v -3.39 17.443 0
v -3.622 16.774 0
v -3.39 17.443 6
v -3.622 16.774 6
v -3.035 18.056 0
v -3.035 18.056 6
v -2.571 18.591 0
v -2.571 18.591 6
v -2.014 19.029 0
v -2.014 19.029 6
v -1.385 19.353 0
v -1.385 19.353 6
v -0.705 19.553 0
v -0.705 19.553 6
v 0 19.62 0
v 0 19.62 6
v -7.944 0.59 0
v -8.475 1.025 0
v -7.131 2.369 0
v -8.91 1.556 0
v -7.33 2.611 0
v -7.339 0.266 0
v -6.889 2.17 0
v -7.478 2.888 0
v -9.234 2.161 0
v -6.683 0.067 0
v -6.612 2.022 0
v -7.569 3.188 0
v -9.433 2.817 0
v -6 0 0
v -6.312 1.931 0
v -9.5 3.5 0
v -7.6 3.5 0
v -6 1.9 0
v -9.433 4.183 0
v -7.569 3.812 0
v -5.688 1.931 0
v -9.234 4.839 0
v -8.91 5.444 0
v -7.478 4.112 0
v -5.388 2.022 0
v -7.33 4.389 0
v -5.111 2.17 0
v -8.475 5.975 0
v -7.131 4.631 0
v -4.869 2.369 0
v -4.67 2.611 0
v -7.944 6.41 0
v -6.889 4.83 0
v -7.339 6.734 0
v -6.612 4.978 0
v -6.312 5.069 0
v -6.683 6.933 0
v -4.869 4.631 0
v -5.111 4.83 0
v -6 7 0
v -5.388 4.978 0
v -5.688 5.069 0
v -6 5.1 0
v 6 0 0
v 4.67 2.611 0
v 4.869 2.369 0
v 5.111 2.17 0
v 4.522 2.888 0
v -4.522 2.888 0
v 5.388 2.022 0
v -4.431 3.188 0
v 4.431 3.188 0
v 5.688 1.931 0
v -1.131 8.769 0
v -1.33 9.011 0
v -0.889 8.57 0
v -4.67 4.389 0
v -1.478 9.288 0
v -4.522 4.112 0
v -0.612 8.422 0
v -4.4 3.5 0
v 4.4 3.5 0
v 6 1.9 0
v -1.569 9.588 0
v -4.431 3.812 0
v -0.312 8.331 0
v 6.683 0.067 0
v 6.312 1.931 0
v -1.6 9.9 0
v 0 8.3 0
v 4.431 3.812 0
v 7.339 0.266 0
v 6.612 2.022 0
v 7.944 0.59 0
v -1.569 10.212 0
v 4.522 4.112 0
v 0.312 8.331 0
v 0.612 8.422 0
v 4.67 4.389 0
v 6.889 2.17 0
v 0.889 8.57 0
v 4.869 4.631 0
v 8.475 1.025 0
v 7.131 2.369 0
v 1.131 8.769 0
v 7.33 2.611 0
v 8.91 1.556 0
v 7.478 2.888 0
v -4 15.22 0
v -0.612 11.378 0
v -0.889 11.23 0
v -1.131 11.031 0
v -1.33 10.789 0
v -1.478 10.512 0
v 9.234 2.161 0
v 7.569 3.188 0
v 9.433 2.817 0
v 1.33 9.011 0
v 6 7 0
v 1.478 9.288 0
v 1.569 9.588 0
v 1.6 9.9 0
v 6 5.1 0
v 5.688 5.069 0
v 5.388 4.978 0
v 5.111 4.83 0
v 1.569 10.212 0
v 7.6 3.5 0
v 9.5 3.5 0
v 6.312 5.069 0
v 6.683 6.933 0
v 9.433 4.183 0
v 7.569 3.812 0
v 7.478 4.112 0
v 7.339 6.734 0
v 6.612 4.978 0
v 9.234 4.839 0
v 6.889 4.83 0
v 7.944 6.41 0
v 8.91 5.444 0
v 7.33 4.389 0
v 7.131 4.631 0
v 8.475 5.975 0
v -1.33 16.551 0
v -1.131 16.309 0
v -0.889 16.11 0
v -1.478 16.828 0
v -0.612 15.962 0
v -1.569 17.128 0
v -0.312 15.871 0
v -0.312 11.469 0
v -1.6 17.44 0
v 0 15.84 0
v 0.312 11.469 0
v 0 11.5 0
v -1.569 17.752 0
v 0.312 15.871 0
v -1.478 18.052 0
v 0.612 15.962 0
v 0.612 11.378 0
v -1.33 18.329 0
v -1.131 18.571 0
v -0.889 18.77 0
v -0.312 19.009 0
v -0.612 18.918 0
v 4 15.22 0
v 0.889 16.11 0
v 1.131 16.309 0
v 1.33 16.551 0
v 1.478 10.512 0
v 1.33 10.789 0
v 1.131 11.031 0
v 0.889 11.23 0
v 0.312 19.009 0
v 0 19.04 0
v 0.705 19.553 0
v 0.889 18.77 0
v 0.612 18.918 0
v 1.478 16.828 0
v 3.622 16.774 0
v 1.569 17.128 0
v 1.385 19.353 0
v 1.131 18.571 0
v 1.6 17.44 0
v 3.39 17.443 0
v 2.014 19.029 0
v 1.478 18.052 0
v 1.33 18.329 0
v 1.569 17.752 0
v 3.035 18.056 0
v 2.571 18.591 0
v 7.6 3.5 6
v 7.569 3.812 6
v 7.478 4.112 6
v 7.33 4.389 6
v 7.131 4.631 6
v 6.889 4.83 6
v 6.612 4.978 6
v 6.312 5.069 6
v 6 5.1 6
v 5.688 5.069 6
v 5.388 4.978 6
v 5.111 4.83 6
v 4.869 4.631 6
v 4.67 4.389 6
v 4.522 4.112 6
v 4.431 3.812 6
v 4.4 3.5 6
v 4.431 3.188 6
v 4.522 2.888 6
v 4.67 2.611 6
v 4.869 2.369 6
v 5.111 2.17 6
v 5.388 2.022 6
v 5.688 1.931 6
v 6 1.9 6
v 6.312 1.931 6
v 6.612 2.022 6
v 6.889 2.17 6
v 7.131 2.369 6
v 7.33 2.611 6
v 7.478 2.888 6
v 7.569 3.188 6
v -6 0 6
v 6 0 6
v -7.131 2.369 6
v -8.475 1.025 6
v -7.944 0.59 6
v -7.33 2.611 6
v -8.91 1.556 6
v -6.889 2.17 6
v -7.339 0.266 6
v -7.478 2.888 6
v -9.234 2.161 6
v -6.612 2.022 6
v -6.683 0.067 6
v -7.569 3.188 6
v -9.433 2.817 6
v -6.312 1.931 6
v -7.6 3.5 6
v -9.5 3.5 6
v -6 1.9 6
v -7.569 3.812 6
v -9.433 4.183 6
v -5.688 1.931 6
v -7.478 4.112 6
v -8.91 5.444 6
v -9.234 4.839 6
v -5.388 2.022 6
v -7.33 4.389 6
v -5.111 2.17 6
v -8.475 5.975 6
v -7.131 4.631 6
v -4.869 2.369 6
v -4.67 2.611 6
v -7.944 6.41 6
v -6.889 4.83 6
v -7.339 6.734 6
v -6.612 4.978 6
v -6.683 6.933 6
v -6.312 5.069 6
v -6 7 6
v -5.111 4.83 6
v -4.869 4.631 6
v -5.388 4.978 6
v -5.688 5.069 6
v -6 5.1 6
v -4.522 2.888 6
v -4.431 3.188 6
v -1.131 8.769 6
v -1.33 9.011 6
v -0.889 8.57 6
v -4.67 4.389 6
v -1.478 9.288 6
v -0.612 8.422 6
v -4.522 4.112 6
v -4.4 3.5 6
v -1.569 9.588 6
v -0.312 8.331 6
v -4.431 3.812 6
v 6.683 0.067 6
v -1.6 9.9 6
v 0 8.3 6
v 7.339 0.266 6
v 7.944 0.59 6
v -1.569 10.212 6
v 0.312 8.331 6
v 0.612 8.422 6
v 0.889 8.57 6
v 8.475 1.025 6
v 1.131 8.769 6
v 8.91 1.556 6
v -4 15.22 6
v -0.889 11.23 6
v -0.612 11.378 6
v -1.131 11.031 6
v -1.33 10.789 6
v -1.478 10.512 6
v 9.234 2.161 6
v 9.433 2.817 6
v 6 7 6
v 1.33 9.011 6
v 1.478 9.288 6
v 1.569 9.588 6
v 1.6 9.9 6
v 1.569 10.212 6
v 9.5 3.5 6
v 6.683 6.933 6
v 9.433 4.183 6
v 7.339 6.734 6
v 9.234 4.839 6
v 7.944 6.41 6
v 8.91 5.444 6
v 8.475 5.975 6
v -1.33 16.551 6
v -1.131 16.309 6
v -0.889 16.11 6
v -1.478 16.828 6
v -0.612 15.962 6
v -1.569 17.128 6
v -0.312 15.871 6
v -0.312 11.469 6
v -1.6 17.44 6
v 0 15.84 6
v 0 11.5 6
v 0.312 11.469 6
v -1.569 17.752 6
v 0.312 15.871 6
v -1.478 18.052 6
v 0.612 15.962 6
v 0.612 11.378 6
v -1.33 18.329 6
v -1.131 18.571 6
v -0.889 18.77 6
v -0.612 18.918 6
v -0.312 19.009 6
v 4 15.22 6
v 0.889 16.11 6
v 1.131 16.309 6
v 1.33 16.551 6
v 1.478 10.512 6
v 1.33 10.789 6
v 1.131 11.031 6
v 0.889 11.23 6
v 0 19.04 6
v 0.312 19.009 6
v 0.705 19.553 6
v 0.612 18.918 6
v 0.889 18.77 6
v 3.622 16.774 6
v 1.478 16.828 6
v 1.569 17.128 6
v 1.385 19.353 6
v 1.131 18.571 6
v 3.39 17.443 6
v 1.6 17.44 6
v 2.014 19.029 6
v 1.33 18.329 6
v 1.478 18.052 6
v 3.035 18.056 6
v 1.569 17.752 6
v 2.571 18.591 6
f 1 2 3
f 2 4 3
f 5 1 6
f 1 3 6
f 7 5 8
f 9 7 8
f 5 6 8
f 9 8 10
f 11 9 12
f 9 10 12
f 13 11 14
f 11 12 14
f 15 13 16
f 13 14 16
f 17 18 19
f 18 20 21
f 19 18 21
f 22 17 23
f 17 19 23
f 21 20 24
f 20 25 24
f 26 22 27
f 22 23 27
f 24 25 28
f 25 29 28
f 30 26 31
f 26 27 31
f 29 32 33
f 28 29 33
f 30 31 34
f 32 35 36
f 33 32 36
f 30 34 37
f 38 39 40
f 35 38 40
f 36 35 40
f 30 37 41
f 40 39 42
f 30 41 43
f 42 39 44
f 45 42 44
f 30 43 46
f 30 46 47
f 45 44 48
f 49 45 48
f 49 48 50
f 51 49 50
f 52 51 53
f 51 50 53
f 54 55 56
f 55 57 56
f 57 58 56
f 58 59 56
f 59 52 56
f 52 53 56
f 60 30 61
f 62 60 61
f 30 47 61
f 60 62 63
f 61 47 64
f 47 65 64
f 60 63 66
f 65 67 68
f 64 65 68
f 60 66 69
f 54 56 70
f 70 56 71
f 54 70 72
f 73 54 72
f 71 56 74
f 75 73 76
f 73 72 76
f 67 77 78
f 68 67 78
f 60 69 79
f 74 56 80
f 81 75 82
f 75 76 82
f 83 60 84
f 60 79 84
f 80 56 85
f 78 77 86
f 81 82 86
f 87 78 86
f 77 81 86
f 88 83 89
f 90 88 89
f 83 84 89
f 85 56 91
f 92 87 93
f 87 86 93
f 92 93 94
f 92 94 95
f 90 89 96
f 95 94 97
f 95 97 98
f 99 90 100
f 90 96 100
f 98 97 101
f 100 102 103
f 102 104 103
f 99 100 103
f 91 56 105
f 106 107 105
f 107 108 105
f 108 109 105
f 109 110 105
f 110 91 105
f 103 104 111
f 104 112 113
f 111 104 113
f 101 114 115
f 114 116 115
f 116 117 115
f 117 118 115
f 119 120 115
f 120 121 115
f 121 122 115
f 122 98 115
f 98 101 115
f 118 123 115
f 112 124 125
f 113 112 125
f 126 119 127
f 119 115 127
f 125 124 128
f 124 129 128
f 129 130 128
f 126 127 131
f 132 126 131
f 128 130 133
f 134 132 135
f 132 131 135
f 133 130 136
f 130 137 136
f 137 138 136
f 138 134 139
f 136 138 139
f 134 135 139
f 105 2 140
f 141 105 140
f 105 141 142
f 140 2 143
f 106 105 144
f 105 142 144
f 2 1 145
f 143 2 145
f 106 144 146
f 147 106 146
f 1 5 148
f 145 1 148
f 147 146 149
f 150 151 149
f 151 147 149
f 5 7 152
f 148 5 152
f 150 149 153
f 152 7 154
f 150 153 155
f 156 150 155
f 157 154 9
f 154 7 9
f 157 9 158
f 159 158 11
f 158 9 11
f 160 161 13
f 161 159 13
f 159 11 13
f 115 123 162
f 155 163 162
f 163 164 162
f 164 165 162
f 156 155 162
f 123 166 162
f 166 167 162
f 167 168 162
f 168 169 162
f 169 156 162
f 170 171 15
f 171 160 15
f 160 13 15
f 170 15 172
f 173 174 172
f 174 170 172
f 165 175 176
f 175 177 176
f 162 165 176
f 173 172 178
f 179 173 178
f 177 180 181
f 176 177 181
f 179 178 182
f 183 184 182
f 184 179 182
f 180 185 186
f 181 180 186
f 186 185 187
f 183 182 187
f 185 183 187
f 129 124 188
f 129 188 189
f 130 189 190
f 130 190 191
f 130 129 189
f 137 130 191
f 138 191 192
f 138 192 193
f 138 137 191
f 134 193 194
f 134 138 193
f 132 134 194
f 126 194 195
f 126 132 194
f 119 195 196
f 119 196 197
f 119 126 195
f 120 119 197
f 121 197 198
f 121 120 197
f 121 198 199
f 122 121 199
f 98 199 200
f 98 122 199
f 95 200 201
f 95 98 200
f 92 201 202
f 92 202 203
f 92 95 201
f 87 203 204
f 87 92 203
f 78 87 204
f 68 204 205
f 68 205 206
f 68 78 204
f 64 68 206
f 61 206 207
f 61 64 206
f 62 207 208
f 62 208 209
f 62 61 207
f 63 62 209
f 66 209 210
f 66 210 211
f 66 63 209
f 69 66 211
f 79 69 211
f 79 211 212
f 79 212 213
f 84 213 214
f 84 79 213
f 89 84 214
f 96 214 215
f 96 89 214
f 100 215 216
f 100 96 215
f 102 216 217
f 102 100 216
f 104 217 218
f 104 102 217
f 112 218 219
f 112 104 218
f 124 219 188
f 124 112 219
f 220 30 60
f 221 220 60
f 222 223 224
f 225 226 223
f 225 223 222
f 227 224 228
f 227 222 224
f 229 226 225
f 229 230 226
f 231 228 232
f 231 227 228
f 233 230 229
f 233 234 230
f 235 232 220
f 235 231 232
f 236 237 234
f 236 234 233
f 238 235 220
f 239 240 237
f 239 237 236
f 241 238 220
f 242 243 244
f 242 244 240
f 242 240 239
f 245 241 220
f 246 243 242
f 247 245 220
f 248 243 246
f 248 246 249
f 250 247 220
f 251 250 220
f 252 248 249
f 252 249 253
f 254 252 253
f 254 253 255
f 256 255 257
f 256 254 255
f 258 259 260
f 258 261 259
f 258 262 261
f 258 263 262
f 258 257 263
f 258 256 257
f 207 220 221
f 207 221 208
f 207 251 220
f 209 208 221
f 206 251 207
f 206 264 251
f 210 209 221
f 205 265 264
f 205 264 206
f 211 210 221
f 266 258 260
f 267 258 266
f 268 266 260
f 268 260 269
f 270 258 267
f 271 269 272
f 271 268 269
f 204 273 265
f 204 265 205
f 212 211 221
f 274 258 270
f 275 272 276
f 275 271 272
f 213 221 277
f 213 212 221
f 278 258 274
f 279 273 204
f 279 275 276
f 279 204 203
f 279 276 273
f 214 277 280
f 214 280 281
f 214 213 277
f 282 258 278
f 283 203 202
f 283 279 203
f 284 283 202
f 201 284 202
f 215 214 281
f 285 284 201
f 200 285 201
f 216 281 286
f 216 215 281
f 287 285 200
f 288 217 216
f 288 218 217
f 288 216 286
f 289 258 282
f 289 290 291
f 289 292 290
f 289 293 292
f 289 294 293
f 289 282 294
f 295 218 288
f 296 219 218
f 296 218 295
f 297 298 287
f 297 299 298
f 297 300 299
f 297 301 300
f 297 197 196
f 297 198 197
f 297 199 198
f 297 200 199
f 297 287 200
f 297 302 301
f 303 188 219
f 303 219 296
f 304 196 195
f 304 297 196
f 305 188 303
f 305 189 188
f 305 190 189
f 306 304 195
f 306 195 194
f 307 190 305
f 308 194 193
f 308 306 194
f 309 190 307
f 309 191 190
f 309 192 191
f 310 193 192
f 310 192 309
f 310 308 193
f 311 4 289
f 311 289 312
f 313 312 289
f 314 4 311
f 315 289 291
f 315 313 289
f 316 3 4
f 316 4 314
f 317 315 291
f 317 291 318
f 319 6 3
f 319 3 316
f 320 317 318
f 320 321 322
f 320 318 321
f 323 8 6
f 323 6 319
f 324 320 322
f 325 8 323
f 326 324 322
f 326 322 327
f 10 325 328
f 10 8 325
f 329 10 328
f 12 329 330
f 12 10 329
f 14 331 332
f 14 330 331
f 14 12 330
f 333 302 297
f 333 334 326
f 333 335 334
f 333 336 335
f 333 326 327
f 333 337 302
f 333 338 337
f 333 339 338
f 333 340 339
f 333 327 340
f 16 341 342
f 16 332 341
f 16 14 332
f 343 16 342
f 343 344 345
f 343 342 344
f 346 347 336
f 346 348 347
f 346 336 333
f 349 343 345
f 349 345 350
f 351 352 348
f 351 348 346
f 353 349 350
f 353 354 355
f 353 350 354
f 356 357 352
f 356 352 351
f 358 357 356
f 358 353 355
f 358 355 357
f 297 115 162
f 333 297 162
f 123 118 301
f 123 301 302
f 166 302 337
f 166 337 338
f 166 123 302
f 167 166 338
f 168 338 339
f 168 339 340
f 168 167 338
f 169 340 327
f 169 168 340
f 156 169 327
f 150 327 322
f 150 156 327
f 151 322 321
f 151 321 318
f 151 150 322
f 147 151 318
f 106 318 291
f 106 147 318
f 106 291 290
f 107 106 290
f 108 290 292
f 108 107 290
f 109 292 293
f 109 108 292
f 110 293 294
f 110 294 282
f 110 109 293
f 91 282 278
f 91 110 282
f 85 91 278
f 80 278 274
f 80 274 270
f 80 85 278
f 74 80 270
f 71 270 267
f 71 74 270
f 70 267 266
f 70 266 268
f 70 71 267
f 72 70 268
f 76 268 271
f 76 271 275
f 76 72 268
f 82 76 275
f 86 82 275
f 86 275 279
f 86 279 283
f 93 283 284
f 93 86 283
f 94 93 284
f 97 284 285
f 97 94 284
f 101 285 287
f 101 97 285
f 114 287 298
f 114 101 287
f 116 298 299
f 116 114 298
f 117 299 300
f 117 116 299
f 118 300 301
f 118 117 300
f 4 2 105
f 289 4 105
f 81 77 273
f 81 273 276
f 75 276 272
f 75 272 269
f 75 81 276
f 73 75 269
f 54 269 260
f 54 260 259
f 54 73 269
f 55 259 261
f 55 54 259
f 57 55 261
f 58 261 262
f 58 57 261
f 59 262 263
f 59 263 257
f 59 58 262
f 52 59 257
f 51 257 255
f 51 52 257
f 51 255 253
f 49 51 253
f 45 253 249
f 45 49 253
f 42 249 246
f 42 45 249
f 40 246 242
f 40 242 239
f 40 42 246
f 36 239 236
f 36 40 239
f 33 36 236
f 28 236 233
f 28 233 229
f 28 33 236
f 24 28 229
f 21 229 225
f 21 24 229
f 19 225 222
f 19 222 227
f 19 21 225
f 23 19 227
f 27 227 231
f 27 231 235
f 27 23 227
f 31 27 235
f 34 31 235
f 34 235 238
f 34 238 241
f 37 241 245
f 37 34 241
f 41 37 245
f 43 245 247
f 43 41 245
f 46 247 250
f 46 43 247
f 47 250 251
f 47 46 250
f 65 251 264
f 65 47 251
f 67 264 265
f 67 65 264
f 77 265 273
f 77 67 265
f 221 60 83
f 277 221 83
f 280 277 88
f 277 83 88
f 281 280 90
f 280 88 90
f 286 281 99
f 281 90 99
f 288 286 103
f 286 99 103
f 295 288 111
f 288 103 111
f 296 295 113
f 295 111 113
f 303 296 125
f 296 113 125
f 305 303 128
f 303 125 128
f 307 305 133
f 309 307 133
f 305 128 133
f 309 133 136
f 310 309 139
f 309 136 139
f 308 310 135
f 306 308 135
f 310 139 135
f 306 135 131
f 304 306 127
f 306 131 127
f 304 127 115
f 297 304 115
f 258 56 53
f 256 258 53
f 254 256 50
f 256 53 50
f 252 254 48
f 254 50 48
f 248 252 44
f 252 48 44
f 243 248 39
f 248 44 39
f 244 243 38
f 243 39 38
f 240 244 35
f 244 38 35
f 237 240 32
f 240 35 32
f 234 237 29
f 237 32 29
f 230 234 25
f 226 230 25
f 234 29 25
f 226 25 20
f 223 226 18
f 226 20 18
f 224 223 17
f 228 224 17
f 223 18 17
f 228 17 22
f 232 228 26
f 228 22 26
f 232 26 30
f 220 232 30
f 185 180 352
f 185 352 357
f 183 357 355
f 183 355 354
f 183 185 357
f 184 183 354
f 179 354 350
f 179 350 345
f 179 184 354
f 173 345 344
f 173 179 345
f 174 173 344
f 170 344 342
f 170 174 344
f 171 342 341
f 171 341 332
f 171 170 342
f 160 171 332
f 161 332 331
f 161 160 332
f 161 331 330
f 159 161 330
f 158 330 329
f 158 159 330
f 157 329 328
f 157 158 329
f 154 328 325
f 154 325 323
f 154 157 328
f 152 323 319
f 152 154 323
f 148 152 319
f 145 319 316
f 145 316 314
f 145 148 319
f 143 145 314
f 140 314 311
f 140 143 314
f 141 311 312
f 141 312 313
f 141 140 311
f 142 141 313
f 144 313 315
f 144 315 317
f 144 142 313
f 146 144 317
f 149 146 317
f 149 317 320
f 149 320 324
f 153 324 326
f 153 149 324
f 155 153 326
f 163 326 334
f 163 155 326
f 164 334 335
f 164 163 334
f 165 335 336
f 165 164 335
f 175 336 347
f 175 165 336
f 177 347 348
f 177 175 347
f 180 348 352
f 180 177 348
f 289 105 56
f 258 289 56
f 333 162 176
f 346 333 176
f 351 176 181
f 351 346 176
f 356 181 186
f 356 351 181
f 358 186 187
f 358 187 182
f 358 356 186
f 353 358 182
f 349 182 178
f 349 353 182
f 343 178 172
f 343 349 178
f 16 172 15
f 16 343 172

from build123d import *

# Parameters (mm, degrees)
CROQUIS1_R              = 1.6
SALIENTE_EXTRUIR1_DEPTH = 6
REDONDEO1_R             = 3.727663


with BuildPart() as part:
    # Croquis1 → Saliente-Extruir1 (new body)
    with BuildSketch(Plane.XY):
        with BuildLine():
            Line((-6, 0), (6, 0))
            ThreePointArc((6, 0), (9.5, 3.5), (6, 7))
            Line((6, 7), (4, 15.22))
            Line((4, 15.22), (2.929440389, 19.62))
            Line((2.929440389, 19.62), (-2.929440389, 19.62))
            Line((-2.929440389, 19.62), (-4, 15.22))
            Line((-4, 15.22), (-6, 7))
            ThreePointArc((-6, 7), (-9.5, 3.5), (-6, 0))
        make_face()
        with Locations((6, 3.5)):
            Circle(CROQUIS1_R, mode=Mode.SUBTRACT)
        with Locations((-6, 3.5)):
            Circle(CROQUIS1_R, mode=Mode.SUBTRACT)
        with Locations((0, 17.44)):
            Circle(CROQUIS1_R, mode=Mode.SUBTRACT)
        with Locations((0, 9.9)):
            Circle(CROQUIS1_R, mode=Mode.SUBTRACT)
    extrude(amount=SALIENTE_EXTRUIR1_DEPTH)

    # Redondeo1
    redondeo1_edges = [part.edges().sort_by_distance(p)[0] for p in [
        (-2.929440389, 19.62, 3),
        (2.929440389, 19.62, 3),
    ]]
    fillet(redondeo1_edges, radius=REDONDEO1_R)


solid = part.part
